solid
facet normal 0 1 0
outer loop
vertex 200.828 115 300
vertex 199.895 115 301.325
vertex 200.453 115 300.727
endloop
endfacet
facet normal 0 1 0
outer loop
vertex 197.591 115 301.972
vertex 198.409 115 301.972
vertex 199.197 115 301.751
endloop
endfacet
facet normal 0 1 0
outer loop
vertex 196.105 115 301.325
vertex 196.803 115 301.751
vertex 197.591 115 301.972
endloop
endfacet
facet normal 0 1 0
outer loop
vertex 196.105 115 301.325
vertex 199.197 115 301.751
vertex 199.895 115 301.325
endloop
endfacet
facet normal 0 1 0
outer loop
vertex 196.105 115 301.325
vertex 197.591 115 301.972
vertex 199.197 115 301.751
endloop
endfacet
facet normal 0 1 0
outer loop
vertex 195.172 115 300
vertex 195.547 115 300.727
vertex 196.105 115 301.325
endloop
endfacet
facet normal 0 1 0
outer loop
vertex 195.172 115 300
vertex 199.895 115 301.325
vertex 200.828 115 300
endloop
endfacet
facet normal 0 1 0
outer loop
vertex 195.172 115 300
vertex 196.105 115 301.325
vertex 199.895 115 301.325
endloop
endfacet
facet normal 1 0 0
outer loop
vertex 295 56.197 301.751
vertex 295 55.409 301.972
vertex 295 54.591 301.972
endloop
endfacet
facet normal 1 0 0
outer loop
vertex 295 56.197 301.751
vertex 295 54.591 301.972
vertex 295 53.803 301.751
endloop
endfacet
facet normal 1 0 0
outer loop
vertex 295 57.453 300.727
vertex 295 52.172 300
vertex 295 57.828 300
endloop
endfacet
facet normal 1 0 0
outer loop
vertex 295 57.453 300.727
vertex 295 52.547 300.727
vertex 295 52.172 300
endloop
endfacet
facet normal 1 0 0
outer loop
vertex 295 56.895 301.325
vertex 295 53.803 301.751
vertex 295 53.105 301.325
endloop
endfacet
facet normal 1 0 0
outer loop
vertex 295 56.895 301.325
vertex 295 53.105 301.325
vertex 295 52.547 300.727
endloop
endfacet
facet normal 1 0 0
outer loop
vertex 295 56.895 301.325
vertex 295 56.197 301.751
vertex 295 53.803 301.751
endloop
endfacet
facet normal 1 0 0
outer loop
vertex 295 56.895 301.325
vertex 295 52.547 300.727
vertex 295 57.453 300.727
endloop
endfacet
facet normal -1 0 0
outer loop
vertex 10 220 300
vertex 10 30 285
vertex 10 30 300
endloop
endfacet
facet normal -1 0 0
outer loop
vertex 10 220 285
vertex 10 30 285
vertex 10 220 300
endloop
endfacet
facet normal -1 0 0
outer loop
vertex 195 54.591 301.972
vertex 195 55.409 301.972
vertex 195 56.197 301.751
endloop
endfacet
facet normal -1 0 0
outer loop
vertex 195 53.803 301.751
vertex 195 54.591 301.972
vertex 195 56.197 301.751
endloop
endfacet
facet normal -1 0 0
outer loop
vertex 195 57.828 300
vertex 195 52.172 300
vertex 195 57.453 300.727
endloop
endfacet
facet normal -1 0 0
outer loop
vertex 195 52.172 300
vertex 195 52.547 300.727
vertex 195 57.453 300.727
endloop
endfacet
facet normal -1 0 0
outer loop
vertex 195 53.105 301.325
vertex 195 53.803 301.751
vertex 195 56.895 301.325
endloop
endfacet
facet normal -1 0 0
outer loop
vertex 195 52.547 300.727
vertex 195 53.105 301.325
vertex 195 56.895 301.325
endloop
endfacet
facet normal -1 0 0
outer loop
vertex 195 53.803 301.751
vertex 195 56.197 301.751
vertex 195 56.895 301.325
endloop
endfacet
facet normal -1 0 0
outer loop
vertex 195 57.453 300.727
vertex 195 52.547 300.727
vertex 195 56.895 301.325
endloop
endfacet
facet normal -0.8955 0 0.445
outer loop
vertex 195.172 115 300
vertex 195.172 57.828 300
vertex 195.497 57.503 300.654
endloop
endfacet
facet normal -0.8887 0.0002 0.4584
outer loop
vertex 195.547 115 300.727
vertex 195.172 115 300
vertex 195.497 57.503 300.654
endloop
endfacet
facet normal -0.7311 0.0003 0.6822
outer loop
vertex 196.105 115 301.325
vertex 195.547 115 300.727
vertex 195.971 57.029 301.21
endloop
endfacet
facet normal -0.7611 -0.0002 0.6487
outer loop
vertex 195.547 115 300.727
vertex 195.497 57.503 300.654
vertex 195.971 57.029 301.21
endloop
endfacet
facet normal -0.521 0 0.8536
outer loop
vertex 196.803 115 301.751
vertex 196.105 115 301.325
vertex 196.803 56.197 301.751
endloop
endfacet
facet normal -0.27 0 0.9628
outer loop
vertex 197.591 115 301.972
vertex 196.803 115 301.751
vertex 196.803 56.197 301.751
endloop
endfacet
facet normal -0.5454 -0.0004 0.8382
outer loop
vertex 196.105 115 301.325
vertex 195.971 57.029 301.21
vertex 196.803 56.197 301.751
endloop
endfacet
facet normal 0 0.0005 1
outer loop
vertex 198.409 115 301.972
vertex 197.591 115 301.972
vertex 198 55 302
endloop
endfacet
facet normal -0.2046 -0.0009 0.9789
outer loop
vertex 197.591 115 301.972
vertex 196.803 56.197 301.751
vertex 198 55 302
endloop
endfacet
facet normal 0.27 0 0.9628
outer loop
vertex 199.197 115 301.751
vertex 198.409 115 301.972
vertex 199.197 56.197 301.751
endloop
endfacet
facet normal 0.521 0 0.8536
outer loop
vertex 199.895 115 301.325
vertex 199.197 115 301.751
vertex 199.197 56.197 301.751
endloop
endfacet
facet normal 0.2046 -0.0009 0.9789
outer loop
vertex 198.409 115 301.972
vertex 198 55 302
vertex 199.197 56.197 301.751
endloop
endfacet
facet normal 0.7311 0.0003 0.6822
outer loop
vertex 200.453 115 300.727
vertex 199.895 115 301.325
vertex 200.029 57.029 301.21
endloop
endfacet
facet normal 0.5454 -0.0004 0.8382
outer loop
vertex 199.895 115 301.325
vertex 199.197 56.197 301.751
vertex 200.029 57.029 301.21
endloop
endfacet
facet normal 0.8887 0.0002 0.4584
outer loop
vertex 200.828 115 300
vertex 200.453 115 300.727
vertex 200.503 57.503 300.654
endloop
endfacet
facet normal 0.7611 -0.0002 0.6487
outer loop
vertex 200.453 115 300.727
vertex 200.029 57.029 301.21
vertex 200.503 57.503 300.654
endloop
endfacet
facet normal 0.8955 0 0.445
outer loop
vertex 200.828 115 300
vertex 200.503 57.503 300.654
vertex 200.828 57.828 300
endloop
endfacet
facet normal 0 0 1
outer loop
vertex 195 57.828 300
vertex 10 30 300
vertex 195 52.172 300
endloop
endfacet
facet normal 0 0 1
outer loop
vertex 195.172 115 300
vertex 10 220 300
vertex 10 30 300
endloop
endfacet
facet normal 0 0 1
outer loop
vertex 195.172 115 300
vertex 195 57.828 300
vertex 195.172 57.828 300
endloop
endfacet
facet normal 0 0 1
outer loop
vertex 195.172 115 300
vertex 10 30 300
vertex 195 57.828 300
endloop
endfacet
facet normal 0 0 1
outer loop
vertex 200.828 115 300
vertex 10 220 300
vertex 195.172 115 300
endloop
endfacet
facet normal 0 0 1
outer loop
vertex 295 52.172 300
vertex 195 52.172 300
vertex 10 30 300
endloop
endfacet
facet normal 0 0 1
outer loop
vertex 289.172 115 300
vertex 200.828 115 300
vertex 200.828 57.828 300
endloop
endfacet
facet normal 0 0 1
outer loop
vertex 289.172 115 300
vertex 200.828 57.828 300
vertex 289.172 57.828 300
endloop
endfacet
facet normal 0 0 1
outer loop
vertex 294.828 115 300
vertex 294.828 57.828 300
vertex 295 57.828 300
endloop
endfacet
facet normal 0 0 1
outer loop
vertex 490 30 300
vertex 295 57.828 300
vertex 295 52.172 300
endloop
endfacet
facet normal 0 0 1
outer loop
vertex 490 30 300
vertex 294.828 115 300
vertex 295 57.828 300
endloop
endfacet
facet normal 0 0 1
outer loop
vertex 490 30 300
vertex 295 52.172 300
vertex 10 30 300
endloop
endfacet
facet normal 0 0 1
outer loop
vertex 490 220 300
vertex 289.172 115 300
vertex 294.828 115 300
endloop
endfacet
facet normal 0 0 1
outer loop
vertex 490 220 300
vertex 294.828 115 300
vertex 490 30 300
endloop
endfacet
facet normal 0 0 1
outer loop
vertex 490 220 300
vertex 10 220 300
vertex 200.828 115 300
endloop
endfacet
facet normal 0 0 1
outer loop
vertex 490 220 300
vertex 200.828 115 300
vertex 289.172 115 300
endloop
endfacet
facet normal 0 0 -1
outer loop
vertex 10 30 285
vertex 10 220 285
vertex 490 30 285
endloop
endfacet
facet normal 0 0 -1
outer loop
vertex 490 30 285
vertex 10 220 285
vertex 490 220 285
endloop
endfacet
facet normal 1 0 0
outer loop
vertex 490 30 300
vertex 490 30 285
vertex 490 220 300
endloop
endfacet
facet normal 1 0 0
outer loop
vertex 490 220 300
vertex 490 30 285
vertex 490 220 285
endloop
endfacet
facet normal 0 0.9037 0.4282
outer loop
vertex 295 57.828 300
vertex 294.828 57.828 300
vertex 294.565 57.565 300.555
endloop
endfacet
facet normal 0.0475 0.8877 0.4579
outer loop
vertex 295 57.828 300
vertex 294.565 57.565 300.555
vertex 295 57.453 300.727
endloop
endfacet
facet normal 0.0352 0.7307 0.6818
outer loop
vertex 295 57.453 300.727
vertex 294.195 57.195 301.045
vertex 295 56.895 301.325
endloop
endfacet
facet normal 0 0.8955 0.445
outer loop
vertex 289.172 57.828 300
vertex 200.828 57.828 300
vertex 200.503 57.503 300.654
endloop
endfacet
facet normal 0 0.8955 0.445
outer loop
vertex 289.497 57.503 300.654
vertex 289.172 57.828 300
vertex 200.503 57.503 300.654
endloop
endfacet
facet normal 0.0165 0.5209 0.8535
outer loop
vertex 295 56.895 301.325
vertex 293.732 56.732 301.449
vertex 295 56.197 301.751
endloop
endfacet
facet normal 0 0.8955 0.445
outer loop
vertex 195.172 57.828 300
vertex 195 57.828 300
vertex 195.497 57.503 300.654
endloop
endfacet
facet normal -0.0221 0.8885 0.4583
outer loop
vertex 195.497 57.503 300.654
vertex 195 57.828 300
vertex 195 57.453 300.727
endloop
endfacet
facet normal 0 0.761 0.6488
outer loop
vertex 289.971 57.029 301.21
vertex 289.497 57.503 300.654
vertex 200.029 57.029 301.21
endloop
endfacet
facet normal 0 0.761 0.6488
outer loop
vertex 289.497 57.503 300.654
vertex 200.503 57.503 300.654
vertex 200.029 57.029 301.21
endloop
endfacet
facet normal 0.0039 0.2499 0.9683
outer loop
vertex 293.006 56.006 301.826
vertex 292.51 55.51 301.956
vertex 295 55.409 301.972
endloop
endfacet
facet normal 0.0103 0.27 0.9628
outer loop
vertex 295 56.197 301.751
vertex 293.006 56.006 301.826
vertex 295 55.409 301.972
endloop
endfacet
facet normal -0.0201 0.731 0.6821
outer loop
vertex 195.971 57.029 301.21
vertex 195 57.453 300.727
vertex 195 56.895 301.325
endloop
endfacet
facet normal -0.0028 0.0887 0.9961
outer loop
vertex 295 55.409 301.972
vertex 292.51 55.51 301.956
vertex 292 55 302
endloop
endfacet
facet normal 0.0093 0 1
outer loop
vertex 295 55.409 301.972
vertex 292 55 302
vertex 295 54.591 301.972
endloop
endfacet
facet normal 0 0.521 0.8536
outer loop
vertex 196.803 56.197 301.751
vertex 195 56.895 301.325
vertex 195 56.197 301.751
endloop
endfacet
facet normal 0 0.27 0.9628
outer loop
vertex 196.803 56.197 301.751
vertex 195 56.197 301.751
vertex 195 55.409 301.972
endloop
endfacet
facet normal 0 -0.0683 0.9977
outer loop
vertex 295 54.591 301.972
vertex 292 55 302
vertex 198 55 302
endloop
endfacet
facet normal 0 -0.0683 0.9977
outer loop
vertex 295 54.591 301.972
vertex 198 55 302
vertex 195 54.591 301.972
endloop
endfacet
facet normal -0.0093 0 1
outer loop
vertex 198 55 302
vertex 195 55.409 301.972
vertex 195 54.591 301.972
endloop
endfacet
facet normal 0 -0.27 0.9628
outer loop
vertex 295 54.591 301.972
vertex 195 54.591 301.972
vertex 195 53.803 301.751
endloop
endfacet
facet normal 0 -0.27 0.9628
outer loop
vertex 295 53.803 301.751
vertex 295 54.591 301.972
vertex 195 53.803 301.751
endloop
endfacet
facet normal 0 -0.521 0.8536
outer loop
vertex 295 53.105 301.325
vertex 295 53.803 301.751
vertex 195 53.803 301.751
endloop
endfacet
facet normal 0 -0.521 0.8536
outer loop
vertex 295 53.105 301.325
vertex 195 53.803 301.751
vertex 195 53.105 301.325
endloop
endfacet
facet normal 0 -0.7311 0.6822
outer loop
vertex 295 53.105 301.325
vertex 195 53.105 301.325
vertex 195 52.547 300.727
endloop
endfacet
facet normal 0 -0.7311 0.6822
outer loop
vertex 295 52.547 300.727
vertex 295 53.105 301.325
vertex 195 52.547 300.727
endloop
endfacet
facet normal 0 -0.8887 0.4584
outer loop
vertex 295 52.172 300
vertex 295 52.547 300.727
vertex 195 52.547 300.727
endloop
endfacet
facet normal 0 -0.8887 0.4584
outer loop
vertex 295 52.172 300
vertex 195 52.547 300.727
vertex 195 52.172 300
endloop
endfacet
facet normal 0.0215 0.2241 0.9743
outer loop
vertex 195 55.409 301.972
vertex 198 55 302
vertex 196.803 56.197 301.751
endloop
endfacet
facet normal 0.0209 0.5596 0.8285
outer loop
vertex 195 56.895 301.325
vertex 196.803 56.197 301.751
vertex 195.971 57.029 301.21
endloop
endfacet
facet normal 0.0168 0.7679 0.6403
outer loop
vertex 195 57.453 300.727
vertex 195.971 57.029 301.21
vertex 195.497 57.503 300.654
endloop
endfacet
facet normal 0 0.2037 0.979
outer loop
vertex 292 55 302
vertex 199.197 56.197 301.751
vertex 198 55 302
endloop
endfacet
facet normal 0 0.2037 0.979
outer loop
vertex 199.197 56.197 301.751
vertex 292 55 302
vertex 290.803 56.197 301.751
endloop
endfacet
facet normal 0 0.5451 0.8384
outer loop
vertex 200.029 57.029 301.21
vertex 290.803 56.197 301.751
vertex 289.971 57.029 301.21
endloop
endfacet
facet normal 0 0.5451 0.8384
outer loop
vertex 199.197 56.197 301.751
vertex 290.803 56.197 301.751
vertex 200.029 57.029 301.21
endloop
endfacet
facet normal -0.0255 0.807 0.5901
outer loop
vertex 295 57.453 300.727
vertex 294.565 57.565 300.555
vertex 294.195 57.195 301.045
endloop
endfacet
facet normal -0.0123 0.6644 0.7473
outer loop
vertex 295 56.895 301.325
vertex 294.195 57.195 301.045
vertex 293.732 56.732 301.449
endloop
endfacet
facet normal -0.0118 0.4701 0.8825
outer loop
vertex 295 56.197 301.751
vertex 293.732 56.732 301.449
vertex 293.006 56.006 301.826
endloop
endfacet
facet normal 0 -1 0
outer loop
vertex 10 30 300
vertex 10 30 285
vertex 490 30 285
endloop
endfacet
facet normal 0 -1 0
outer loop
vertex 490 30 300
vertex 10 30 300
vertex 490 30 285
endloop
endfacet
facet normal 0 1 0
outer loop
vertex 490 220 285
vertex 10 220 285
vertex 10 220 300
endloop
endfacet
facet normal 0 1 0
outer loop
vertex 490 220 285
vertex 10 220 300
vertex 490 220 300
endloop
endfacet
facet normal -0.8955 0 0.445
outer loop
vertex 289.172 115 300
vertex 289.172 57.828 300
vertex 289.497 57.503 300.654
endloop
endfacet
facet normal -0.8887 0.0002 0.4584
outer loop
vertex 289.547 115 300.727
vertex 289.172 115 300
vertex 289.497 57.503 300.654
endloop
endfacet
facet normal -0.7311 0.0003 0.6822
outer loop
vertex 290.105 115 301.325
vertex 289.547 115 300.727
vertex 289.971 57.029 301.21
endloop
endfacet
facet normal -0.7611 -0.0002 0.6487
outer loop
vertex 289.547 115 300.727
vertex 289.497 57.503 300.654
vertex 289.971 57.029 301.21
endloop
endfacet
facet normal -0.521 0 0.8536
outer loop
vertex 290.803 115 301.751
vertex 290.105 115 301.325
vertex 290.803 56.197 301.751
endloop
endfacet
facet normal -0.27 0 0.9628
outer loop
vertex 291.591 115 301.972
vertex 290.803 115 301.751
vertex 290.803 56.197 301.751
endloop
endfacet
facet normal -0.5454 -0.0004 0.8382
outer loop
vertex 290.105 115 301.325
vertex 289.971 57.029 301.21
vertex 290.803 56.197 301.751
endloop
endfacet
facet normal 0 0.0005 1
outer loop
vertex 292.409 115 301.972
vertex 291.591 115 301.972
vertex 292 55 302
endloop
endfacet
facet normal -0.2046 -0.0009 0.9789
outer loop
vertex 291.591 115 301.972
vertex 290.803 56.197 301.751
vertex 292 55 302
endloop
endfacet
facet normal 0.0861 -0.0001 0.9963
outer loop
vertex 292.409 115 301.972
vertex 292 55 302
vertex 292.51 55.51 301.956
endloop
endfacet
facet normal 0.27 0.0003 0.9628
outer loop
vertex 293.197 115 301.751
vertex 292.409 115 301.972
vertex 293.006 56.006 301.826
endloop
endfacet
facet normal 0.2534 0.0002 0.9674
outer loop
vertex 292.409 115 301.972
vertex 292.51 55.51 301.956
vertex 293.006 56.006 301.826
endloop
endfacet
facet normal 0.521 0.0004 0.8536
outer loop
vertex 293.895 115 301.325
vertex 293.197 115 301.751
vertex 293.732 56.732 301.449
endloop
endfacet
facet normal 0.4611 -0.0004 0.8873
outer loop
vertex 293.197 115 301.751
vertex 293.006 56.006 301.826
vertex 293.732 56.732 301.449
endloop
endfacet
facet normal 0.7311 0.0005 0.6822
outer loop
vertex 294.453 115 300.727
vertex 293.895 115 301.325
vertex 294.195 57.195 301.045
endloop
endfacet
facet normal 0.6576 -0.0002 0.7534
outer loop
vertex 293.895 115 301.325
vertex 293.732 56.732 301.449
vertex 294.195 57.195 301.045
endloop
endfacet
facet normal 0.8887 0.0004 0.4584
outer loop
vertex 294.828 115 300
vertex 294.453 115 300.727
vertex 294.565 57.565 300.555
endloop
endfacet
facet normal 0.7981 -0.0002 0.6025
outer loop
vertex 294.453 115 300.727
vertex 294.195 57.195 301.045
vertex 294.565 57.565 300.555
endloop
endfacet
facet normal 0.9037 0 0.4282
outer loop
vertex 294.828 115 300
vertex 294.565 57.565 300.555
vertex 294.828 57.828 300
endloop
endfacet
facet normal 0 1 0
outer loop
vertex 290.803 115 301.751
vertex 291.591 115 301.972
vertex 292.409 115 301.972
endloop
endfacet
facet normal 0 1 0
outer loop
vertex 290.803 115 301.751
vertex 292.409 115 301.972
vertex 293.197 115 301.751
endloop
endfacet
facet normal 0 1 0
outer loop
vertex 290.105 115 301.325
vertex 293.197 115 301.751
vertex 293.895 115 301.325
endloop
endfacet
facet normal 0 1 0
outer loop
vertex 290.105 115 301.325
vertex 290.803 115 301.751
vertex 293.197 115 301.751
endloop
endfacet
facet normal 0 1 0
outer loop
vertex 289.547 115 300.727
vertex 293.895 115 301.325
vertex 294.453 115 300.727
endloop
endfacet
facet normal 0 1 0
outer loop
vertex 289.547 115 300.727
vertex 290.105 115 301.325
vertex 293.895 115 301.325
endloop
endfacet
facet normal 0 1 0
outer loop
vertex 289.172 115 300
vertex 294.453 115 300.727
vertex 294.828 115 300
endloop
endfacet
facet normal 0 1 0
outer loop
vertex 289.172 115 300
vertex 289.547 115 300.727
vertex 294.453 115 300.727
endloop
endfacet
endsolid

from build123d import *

# Parameters (mm, degrees)
CYLINDER026_R             = 3
CYLINDER026_DEPTH         = 60
CYLINDER026_PITCH_ANGLE   = 90
CYLINDER025_R             = 3
CYLINDER025_DEPTH         = 100
CYLINDER025_ROLL_ANGLE    = 90
CYLINDER027_R             = 3
CYLINDER027_DEPTH         = 60
CYLINDER027_PITCH_ANGLE   = 90
FUSION011_PLACEMENT_ANGLE = 90
BOX026_W                  = 480
BOX026_H                  = 190
BOX026_DEPTH              = 15


with BuildPart() as cylinder032:
    # Cylinder026 → Cylinder026 (new body)
    with BuildSketch(Plane.XY):
        Circle(CYLINDER026_R)
    extrude(amount=CYLINDER026_DEPTH)


with BuildPart() as cylinder032_1:
    # Cylinder026 pitch: moved
    add(cylinder032.part.rotate(Axis((0, 0, 0), (0, 1, 0)), CYLINDER026_PITCH_ANGLE))


with BuildPart() as cylinder032_2:
    # Cylinder026 placement: moved
    add(cylinder032_1.part.moved(Location((-50, -3, 0))))


with BuildPart() as fusion010:
    # Cylinder025 → Cylinder025 (new body)
    with BuildSketch(Plane.XY):
        Circle(CYLINDER025_R)
    extrude(amount=CYLINDER025_DEPTH)


with BuildPart() as fusion010_1:
    # Cylinder025 roll: moved
    add(fusion010.part.rotate(Axis((0, 0, 0), (1, 0, 0)), CYLINDER025_ROLL_ANGLE))


with BuildPart() as fusion010_2:
    # Cylinder025 placement: moved
    add(fusion010_1.part.moved(Location((-50, 0, 0))))

    # Fusion010: union Cylinder032
    add(cylinder032_2.part)


with BuildPart() as handle_top:
    # Cylinder027 → Cylinder027 (new body)
    with BuildSketch(Plane.XY):
        Circle(CYLINDER027_R)
    extrude(amount=CYLINDER027_DEPTH)


with BuildPart() as handle_top_1:
    # Cylinder027 pitch: moved
    add(handle_top.part.rotate(Axis((0, 0, 0), (0, 1, 0)), CYLINDER027_PITCH_ANGLE))


with BuildPart() as handle_top_2:
    # Cylinder027 placement: moved
    add(handle_top_1.part.moved(Location((-50, -97, 0))))

    # Fusion011: union Fusion010
    add(fusion010_2.part)


with BuildPart() as handle_top_3:
    # Fusion011 placement: moved
    add(handle_top_2.part.moved(Location((195, 105, 299))).rotate(Axis((195, 105, 299), (0, 0, 1)), FUSION011_PLACEMENT_ANGLE))


with BuildPart() as solar_box_top_cover:
    # Box026 → Box026 (new body)
    with BuildSketch(Plane(origin=(10, 30, 285), x_dir=(1, 0, 0), z_dir=(0, 0, 1))):
        with Locations((240, 95)):
            Rectangle(BOX026_W, BOX026_H)
    extrude(amount=BOX026_DEPTH)

    # Fusion012: union Handle Top
    add(handle_top_3.part)


solid = solar_box_top_cover.part
